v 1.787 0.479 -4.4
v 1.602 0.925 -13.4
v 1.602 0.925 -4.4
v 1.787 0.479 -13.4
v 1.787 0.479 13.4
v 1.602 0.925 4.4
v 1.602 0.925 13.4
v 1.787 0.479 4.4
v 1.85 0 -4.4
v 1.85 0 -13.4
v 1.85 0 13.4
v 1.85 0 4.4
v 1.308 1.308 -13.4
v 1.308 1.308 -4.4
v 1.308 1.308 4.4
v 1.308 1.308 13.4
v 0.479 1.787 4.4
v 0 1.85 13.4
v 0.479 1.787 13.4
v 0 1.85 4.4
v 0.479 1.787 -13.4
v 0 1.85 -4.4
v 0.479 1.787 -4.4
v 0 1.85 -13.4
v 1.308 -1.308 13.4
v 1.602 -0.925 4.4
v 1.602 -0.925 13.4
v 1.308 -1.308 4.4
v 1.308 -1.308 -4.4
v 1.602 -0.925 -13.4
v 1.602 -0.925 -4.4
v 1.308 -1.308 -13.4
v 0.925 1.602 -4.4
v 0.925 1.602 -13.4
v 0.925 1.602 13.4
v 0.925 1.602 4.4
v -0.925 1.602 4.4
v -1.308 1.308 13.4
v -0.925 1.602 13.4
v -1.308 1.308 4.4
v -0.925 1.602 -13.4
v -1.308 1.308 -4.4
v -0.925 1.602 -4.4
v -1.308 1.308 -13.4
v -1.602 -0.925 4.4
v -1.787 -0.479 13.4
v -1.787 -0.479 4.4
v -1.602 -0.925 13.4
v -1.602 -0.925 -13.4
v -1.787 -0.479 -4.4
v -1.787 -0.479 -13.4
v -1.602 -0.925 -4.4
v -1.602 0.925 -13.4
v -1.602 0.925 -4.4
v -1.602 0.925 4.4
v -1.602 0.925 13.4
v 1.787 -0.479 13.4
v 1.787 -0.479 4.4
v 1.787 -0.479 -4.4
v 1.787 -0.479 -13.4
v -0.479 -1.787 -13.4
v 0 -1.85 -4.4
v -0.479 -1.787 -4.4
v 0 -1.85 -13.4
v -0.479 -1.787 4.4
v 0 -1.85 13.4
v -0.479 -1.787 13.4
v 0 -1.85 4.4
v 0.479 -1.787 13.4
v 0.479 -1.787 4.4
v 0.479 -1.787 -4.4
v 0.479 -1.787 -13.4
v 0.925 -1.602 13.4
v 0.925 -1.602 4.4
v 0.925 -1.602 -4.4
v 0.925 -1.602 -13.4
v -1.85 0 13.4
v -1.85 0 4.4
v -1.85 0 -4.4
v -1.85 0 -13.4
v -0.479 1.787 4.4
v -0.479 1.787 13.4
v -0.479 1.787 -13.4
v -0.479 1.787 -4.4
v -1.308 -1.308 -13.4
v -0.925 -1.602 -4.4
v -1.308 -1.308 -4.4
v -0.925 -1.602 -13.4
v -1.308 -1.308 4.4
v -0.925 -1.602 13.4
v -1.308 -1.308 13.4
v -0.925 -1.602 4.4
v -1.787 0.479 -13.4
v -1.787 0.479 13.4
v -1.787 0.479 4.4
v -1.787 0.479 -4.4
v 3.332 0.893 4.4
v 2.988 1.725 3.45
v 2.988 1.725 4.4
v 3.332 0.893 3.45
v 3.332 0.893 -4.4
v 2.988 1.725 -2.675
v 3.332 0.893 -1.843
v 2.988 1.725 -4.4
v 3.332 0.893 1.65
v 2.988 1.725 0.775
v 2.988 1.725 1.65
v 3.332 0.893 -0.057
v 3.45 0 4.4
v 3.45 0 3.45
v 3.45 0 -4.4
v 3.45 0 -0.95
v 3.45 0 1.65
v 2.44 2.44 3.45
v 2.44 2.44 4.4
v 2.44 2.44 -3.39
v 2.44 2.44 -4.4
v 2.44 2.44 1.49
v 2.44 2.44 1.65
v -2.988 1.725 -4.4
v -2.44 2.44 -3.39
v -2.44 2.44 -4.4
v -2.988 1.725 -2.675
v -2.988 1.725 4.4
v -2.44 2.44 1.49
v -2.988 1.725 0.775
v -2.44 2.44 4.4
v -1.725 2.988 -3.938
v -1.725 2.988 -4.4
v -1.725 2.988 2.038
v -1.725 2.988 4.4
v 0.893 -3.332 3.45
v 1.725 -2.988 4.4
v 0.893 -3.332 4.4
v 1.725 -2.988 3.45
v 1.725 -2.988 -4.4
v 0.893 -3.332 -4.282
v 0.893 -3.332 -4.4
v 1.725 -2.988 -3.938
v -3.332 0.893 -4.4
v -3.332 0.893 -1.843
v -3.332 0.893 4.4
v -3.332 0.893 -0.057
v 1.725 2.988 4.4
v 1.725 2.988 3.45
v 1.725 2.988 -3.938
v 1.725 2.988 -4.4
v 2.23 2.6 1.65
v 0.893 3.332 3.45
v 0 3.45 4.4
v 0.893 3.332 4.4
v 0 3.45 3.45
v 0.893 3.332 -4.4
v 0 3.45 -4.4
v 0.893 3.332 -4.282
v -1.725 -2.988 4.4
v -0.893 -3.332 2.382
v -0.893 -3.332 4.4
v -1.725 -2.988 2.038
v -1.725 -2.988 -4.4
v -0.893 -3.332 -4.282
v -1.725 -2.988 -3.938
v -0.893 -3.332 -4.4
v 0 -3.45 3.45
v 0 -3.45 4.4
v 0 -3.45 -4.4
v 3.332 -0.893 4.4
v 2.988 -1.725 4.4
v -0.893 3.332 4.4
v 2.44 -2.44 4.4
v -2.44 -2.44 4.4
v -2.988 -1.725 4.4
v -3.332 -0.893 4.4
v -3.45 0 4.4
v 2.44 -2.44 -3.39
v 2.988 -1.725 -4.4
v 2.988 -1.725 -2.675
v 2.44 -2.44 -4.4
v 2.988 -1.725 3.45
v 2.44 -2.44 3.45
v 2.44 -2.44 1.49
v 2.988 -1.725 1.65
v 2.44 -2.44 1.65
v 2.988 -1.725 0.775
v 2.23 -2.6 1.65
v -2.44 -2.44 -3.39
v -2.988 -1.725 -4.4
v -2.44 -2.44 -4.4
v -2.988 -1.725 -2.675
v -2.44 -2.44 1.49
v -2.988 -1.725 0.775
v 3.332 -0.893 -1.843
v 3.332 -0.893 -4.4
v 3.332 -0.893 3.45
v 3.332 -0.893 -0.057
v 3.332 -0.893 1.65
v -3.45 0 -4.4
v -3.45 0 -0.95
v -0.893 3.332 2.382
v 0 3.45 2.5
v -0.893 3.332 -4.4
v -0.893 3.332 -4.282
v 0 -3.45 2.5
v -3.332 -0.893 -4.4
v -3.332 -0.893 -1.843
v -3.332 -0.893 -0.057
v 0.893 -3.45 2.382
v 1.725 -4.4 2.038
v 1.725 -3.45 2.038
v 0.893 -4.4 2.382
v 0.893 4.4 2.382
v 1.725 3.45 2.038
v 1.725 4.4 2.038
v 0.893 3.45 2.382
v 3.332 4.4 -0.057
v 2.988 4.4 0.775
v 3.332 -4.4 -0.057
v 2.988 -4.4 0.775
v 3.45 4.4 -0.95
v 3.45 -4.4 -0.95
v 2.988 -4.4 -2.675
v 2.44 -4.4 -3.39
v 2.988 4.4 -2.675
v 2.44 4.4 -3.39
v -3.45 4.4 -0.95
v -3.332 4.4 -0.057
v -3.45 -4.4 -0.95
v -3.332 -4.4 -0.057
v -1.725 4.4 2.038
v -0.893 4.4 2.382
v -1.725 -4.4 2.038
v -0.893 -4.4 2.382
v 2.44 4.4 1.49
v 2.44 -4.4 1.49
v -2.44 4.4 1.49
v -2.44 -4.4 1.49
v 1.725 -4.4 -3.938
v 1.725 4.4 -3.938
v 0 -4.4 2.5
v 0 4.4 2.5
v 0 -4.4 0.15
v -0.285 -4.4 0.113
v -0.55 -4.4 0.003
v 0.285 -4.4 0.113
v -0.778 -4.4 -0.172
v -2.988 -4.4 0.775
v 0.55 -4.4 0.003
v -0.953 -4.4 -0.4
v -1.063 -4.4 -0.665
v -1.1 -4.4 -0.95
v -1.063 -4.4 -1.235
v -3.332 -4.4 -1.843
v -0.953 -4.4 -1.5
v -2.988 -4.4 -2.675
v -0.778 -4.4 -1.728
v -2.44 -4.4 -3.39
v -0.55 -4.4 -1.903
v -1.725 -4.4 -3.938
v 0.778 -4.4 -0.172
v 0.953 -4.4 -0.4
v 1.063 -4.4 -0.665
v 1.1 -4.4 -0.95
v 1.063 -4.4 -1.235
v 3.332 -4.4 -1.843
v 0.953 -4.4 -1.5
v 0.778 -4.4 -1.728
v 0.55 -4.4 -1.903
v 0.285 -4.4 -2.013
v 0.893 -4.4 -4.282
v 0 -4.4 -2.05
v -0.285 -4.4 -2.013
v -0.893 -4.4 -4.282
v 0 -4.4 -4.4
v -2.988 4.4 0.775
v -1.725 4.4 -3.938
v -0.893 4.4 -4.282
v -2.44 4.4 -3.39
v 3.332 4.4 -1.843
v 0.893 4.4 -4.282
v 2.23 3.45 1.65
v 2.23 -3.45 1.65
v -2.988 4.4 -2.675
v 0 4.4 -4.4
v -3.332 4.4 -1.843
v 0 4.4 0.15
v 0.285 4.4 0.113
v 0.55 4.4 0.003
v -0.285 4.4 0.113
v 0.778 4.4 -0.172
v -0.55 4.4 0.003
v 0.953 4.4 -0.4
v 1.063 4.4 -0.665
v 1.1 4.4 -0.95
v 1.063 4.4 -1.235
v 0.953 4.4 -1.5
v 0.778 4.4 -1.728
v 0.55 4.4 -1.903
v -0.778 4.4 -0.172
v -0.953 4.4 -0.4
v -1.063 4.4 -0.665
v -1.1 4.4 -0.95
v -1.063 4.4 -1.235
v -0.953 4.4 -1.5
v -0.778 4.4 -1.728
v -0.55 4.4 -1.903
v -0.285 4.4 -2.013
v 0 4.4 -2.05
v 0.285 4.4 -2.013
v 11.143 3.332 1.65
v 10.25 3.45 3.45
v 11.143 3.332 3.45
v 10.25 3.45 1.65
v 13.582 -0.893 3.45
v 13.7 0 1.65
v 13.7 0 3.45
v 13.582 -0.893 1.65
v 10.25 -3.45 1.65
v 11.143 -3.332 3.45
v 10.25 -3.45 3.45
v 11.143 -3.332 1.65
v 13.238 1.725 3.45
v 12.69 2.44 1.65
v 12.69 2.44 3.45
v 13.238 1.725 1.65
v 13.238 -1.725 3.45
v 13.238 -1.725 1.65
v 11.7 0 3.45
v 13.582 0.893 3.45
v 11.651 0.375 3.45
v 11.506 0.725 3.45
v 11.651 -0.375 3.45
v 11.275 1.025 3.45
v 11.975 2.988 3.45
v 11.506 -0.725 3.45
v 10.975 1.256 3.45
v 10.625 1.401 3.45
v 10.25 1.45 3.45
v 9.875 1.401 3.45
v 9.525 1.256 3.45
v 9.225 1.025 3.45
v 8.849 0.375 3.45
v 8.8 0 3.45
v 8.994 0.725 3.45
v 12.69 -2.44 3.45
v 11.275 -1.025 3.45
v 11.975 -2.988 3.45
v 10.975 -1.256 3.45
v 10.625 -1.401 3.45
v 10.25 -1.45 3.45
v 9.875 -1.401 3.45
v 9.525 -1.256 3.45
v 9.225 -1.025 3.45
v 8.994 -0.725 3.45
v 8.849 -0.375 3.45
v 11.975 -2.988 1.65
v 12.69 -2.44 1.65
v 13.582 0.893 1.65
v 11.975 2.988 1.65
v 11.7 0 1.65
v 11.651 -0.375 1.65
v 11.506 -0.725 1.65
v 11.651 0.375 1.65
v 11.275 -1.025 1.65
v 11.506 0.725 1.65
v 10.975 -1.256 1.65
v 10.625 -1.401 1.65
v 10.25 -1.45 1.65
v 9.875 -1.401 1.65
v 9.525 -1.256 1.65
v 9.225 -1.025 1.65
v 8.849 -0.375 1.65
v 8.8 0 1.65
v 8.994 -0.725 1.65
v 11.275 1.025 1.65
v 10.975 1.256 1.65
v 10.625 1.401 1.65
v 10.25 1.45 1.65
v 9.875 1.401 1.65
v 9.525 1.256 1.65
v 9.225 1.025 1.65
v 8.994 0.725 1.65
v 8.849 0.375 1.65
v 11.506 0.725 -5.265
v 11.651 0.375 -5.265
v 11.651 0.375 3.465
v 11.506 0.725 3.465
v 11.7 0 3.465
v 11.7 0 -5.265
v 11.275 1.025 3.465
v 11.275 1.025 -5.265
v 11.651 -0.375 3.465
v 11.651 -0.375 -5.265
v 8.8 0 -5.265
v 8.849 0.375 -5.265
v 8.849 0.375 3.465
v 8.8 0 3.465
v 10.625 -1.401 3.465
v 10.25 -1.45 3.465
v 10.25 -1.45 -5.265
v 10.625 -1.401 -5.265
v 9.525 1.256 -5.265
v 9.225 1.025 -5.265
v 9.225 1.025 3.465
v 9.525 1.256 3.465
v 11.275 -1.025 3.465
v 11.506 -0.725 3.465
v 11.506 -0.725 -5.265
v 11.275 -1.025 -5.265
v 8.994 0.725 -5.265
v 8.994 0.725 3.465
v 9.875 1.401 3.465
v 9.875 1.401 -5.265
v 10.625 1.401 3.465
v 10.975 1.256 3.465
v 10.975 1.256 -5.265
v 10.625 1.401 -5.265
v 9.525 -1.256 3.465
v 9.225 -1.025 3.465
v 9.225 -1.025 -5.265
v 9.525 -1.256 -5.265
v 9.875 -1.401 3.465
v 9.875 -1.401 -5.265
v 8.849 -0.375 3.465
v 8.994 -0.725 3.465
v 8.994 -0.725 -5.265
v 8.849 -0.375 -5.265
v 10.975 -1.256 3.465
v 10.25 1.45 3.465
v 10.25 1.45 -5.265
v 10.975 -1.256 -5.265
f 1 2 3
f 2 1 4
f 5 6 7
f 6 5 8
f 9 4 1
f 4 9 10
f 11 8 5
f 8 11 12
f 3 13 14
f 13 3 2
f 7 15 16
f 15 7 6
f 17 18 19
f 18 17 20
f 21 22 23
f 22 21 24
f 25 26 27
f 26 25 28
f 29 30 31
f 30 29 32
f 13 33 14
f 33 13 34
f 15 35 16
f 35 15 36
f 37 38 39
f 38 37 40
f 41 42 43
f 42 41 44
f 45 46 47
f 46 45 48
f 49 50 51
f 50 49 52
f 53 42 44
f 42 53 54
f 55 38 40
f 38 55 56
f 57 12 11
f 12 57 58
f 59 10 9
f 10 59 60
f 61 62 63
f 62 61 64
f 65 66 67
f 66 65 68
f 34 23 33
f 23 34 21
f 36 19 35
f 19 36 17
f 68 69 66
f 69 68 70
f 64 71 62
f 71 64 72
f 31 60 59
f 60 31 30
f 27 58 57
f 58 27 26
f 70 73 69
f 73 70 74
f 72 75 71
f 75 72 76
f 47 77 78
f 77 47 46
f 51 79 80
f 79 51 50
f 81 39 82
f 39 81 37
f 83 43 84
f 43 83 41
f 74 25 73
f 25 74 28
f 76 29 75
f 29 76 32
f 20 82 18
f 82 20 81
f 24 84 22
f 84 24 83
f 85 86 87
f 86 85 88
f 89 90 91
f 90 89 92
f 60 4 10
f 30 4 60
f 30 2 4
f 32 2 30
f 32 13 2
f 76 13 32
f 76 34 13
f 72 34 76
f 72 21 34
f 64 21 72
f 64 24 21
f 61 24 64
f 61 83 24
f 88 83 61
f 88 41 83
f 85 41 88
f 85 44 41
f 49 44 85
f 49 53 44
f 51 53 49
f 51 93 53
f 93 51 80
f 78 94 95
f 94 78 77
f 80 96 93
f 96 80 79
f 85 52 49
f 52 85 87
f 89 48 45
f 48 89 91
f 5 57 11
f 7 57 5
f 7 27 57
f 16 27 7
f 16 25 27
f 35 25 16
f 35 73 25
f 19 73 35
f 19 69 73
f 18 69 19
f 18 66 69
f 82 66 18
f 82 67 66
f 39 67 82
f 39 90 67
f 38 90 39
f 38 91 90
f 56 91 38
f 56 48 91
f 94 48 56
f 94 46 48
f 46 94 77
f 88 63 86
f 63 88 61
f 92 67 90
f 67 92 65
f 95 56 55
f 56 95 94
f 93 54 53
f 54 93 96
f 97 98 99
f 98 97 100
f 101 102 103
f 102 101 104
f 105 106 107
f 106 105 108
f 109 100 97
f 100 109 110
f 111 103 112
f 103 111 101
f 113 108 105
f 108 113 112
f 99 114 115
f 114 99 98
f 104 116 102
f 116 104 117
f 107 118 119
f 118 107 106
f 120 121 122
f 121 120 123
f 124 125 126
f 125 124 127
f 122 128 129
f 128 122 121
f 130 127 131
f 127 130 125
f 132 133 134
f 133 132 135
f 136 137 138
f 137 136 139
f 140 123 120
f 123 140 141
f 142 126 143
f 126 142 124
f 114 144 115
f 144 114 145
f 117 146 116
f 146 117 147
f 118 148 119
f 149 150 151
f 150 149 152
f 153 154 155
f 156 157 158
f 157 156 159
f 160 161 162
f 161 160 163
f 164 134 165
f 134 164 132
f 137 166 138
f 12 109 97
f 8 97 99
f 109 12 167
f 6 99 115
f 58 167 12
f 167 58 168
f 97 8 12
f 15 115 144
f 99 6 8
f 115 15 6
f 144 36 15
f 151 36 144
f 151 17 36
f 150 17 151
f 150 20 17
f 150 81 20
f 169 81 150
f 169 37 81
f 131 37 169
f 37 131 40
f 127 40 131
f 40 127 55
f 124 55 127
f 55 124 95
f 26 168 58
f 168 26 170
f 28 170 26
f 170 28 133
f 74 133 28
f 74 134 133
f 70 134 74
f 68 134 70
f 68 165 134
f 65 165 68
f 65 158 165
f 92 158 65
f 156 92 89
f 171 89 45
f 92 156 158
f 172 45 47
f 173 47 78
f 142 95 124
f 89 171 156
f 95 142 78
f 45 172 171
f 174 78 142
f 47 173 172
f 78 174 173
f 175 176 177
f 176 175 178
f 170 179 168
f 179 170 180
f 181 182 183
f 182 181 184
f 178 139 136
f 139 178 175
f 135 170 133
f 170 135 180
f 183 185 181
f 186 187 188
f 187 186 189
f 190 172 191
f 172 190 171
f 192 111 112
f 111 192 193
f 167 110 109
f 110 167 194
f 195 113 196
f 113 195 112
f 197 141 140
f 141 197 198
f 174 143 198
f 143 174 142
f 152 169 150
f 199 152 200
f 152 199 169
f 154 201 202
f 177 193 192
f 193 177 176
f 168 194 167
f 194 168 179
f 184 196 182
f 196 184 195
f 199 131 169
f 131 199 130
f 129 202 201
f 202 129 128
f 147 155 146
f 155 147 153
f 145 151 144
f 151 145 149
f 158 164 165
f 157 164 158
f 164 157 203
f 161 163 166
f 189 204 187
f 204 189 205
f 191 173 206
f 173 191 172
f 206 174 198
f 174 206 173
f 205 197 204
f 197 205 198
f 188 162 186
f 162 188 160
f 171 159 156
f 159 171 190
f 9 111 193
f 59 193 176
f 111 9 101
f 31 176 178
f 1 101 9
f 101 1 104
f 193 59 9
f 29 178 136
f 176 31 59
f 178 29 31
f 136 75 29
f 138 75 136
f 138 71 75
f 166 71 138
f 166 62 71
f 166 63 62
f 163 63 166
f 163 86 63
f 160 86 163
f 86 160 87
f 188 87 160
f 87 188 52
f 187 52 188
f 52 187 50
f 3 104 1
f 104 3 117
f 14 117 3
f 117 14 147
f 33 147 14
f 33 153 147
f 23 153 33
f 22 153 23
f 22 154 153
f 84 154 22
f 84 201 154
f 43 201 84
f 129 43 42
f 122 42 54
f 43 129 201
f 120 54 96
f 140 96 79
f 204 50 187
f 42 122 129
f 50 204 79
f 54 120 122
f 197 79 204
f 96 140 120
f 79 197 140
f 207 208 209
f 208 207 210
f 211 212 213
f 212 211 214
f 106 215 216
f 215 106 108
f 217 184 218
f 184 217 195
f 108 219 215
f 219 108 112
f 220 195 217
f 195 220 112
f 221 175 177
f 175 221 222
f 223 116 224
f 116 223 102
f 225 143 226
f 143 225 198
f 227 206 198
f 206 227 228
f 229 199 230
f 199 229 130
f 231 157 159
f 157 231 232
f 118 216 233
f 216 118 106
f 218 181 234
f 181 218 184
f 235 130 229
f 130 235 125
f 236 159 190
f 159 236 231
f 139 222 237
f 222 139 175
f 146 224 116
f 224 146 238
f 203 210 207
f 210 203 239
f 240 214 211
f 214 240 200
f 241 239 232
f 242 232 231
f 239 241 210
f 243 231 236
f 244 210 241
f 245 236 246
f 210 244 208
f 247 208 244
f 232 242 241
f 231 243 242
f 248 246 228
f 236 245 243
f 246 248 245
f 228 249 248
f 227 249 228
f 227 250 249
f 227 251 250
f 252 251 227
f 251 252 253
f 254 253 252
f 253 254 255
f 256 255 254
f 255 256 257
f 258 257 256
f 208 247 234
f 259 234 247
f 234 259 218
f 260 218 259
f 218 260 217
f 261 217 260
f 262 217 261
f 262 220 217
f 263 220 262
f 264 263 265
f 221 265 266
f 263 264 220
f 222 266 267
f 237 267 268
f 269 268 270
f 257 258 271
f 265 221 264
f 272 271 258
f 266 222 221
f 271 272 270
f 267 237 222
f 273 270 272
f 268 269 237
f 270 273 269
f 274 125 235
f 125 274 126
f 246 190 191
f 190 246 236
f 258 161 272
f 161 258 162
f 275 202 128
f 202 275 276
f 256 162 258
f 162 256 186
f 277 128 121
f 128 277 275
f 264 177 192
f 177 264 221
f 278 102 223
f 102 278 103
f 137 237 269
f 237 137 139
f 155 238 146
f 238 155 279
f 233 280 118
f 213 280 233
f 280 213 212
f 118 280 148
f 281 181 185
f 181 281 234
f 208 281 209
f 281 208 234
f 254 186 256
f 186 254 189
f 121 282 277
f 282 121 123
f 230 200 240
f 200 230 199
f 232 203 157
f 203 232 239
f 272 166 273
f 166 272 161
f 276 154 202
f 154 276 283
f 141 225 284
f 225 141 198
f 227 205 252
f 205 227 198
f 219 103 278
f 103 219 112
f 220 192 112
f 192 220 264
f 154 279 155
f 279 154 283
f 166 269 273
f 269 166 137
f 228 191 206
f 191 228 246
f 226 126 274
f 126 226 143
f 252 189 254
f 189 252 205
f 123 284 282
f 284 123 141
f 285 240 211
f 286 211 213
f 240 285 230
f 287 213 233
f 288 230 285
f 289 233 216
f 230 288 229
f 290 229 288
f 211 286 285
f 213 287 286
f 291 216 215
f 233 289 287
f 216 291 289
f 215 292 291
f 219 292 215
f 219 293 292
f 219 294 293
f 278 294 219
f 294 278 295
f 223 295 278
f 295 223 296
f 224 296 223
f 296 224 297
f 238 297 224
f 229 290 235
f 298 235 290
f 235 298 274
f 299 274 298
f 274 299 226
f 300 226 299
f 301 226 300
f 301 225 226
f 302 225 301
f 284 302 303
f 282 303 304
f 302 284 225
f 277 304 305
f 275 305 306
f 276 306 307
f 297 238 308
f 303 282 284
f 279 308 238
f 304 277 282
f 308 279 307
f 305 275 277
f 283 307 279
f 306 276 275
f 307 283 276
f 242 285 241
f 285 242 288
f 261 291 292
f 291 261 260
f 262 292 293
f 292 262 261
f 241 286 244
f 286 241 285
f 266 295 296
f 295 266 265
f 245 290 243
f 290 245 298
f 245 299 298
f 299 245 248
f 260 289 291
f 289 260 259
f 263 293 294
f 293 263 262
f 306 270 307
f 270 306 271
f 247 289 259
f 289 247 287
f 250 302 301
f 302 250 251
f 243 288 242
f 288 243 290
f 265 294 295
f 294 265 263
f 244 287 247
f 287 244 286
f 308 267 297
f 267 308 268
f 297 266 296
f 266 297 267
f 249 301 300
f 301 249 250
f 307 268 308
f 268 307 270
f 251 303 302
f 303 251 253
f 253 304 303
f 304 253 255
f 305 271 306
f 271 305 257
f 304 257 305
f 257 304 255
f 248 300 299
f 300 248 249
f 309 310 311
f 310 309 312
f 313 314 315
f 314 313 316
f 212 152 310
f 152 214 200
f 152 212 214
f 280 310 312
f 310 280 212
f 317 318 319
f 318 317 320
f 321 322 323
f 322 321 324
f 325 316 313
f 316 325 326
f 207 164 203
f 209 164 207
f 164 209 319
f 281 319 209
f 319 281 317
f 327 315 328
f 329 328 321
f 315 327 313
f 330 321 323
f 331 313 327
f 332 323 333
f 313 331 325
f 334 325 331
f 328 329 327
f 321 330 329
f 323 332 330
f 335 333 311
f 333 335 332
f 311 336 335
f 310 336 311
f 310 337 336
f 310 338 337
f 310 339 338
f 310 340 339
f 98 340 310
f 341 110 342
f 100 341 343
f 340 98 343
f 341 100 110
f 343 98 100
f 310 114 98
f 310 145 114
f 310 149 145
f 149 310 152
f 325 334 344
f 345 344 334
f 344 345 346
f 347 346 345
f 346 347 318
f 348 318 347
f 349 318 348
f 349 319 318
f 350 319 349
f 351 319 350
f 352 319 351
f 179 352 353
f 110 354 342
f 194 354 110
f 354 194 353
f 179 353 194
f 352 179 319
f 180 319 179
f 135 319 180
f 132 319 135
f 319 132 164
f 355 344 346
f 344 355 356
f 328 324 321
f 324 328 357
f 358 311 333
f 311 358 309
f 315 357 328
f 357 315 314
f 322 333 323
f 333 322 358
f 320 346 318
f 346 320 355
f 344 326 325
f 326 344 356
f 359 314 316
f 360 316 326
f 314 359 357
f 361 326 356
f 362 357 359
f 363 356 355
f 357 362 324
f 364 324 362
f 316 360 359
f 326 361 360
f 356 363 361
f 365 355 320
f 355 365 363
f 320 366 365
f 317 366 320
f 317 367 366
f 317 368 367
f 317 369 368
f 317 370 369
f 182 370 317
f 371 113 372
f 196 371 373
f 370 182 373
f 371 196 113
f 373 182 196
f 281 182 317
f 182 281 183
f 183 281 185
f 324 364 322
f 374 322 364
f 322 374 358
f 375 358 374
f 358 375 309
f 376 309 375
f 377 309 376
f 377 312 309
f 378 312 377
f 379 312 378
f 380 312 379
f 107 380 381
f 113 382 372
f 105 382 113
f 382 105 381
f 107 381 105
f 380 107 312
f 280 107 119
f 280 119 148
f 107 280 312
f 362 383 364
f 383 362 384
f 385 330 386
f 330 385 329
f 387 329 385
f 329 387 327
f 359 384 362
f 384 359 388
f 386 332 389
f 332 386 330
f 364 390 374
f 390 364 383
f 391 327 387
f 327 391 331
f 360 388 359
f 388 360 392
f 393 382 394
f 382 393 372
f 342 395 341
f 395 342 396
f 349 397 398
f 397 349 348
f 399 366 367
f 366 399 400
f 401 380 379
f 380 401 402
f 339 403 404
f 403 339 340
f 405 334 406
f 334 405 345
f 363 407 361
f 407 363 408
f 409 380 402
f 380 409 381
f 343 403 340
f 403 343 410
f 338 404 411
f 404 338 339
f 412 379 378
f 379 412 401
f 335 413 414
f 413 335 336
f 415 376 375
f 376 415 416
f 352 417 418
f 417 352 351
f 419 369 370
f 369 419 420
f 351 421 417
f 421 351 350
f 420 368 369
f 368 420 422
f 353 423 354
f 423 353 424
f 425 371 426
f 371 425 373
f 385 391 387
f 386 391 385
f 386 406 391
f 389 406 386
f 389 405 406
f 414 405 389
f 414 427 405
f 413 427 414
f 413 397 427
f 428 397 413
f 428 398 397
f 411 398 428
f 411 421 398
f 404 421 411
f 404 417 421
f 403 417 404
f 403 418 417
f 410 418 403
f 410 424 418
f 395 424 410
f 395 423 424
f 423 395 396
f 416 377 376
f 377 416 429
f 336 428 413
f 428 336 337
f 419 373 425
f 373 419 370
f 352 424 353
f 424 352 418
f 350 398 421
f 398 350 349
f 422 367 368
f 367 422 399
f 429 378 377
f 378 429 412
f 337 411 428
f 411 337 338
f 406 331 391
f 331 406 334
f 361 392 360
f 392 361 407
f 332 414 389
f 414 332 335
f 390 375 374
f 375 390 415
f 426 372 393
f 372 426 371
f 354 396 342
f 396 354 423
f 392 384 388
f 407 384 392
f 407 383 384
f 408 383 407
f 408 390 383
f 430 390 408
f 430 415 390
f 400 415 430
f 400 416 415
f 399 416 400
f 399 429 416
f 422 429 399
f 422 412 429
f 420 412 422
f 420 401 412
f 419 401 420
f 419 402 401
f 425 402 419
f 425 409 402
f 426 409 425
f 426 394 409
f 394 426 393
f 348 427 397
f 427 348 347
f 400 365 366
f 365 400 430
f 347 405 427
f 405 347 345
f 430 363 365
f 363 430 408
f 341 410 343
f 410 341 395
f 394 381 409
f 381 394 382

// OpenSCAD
$fn=24;

$CONNECTOR_LENGTH=26.8;
$CONNECTOR_DIAMETER=3.7;
$MIDDLE_DIAMETER=6.9;
$MIDDLE_LENGTH=8.8;
$PLATE_HEIGHT=1.8;
$PLATE_LENGTH=17.15;
$PIN_DIAMETER=2.9;
$PIN_LENGTH=8.73;
$HOLE_DIAMETER=2.2;

difference(){
    union(){
        cylinder($CONNECTOR_LENGTH, $CONNECTOR_DIAMETER/2, $CONNECTOR_DIAMETER/2, center=true);
        cylinder($MIDDLE_LENGTH, $MIDDLE_DIAMETER/2, $MIDDLE_DIAMETER/2, center=true);

        translate([0,0,-($MIDDLE_LENGTH - $MIDDLE_DIAMETER)/2]){
            rotate([90,0,0]){
                cylinder($MIDDLE_LENGTH, $MIDDLE_DIAMETER/2, $MIDDLE_DIAMETER/2, center=true);   
            }
        }
    }
    translate([0,0,-($MIDDLE_LENGTH - $MIDDLE_DIAMETER)/2]){
        rotate([90,0,0]){
            cylinder($MIDDLE_LENGTH, $HOLE_DIAMETER/2, $HOLE_DIAMETER/2, center=true);
        }
    }
}

translate([0,0,$MIDDLE_DIAMETER/2 - $PLATE_HEIGHT/2]){
    hull(){
        cylinder($PLATE_HEIGHT, $MIDDLE_DIAMETER/2, $MIDDLE_DIAMETER/2, center=true);
        translate([$PLATE_LENGTH - $MIDDLE_DIAMETER,0,0])
            cylinder($PLATE_HEIGHT, $MIDDLE_DIAMETER/2, $MIDDLE_DIAMETER/2, center=true);
    }
}

translate([$PLATE_LENGTH-$MIDDLE_DIAMETER ,0,-$PLATE_HEIGHT/2])
    cylinder($PIN_LENGTH, $PIN_DIAMETER/2, $PIN_DIAMETER/2, center=true);
